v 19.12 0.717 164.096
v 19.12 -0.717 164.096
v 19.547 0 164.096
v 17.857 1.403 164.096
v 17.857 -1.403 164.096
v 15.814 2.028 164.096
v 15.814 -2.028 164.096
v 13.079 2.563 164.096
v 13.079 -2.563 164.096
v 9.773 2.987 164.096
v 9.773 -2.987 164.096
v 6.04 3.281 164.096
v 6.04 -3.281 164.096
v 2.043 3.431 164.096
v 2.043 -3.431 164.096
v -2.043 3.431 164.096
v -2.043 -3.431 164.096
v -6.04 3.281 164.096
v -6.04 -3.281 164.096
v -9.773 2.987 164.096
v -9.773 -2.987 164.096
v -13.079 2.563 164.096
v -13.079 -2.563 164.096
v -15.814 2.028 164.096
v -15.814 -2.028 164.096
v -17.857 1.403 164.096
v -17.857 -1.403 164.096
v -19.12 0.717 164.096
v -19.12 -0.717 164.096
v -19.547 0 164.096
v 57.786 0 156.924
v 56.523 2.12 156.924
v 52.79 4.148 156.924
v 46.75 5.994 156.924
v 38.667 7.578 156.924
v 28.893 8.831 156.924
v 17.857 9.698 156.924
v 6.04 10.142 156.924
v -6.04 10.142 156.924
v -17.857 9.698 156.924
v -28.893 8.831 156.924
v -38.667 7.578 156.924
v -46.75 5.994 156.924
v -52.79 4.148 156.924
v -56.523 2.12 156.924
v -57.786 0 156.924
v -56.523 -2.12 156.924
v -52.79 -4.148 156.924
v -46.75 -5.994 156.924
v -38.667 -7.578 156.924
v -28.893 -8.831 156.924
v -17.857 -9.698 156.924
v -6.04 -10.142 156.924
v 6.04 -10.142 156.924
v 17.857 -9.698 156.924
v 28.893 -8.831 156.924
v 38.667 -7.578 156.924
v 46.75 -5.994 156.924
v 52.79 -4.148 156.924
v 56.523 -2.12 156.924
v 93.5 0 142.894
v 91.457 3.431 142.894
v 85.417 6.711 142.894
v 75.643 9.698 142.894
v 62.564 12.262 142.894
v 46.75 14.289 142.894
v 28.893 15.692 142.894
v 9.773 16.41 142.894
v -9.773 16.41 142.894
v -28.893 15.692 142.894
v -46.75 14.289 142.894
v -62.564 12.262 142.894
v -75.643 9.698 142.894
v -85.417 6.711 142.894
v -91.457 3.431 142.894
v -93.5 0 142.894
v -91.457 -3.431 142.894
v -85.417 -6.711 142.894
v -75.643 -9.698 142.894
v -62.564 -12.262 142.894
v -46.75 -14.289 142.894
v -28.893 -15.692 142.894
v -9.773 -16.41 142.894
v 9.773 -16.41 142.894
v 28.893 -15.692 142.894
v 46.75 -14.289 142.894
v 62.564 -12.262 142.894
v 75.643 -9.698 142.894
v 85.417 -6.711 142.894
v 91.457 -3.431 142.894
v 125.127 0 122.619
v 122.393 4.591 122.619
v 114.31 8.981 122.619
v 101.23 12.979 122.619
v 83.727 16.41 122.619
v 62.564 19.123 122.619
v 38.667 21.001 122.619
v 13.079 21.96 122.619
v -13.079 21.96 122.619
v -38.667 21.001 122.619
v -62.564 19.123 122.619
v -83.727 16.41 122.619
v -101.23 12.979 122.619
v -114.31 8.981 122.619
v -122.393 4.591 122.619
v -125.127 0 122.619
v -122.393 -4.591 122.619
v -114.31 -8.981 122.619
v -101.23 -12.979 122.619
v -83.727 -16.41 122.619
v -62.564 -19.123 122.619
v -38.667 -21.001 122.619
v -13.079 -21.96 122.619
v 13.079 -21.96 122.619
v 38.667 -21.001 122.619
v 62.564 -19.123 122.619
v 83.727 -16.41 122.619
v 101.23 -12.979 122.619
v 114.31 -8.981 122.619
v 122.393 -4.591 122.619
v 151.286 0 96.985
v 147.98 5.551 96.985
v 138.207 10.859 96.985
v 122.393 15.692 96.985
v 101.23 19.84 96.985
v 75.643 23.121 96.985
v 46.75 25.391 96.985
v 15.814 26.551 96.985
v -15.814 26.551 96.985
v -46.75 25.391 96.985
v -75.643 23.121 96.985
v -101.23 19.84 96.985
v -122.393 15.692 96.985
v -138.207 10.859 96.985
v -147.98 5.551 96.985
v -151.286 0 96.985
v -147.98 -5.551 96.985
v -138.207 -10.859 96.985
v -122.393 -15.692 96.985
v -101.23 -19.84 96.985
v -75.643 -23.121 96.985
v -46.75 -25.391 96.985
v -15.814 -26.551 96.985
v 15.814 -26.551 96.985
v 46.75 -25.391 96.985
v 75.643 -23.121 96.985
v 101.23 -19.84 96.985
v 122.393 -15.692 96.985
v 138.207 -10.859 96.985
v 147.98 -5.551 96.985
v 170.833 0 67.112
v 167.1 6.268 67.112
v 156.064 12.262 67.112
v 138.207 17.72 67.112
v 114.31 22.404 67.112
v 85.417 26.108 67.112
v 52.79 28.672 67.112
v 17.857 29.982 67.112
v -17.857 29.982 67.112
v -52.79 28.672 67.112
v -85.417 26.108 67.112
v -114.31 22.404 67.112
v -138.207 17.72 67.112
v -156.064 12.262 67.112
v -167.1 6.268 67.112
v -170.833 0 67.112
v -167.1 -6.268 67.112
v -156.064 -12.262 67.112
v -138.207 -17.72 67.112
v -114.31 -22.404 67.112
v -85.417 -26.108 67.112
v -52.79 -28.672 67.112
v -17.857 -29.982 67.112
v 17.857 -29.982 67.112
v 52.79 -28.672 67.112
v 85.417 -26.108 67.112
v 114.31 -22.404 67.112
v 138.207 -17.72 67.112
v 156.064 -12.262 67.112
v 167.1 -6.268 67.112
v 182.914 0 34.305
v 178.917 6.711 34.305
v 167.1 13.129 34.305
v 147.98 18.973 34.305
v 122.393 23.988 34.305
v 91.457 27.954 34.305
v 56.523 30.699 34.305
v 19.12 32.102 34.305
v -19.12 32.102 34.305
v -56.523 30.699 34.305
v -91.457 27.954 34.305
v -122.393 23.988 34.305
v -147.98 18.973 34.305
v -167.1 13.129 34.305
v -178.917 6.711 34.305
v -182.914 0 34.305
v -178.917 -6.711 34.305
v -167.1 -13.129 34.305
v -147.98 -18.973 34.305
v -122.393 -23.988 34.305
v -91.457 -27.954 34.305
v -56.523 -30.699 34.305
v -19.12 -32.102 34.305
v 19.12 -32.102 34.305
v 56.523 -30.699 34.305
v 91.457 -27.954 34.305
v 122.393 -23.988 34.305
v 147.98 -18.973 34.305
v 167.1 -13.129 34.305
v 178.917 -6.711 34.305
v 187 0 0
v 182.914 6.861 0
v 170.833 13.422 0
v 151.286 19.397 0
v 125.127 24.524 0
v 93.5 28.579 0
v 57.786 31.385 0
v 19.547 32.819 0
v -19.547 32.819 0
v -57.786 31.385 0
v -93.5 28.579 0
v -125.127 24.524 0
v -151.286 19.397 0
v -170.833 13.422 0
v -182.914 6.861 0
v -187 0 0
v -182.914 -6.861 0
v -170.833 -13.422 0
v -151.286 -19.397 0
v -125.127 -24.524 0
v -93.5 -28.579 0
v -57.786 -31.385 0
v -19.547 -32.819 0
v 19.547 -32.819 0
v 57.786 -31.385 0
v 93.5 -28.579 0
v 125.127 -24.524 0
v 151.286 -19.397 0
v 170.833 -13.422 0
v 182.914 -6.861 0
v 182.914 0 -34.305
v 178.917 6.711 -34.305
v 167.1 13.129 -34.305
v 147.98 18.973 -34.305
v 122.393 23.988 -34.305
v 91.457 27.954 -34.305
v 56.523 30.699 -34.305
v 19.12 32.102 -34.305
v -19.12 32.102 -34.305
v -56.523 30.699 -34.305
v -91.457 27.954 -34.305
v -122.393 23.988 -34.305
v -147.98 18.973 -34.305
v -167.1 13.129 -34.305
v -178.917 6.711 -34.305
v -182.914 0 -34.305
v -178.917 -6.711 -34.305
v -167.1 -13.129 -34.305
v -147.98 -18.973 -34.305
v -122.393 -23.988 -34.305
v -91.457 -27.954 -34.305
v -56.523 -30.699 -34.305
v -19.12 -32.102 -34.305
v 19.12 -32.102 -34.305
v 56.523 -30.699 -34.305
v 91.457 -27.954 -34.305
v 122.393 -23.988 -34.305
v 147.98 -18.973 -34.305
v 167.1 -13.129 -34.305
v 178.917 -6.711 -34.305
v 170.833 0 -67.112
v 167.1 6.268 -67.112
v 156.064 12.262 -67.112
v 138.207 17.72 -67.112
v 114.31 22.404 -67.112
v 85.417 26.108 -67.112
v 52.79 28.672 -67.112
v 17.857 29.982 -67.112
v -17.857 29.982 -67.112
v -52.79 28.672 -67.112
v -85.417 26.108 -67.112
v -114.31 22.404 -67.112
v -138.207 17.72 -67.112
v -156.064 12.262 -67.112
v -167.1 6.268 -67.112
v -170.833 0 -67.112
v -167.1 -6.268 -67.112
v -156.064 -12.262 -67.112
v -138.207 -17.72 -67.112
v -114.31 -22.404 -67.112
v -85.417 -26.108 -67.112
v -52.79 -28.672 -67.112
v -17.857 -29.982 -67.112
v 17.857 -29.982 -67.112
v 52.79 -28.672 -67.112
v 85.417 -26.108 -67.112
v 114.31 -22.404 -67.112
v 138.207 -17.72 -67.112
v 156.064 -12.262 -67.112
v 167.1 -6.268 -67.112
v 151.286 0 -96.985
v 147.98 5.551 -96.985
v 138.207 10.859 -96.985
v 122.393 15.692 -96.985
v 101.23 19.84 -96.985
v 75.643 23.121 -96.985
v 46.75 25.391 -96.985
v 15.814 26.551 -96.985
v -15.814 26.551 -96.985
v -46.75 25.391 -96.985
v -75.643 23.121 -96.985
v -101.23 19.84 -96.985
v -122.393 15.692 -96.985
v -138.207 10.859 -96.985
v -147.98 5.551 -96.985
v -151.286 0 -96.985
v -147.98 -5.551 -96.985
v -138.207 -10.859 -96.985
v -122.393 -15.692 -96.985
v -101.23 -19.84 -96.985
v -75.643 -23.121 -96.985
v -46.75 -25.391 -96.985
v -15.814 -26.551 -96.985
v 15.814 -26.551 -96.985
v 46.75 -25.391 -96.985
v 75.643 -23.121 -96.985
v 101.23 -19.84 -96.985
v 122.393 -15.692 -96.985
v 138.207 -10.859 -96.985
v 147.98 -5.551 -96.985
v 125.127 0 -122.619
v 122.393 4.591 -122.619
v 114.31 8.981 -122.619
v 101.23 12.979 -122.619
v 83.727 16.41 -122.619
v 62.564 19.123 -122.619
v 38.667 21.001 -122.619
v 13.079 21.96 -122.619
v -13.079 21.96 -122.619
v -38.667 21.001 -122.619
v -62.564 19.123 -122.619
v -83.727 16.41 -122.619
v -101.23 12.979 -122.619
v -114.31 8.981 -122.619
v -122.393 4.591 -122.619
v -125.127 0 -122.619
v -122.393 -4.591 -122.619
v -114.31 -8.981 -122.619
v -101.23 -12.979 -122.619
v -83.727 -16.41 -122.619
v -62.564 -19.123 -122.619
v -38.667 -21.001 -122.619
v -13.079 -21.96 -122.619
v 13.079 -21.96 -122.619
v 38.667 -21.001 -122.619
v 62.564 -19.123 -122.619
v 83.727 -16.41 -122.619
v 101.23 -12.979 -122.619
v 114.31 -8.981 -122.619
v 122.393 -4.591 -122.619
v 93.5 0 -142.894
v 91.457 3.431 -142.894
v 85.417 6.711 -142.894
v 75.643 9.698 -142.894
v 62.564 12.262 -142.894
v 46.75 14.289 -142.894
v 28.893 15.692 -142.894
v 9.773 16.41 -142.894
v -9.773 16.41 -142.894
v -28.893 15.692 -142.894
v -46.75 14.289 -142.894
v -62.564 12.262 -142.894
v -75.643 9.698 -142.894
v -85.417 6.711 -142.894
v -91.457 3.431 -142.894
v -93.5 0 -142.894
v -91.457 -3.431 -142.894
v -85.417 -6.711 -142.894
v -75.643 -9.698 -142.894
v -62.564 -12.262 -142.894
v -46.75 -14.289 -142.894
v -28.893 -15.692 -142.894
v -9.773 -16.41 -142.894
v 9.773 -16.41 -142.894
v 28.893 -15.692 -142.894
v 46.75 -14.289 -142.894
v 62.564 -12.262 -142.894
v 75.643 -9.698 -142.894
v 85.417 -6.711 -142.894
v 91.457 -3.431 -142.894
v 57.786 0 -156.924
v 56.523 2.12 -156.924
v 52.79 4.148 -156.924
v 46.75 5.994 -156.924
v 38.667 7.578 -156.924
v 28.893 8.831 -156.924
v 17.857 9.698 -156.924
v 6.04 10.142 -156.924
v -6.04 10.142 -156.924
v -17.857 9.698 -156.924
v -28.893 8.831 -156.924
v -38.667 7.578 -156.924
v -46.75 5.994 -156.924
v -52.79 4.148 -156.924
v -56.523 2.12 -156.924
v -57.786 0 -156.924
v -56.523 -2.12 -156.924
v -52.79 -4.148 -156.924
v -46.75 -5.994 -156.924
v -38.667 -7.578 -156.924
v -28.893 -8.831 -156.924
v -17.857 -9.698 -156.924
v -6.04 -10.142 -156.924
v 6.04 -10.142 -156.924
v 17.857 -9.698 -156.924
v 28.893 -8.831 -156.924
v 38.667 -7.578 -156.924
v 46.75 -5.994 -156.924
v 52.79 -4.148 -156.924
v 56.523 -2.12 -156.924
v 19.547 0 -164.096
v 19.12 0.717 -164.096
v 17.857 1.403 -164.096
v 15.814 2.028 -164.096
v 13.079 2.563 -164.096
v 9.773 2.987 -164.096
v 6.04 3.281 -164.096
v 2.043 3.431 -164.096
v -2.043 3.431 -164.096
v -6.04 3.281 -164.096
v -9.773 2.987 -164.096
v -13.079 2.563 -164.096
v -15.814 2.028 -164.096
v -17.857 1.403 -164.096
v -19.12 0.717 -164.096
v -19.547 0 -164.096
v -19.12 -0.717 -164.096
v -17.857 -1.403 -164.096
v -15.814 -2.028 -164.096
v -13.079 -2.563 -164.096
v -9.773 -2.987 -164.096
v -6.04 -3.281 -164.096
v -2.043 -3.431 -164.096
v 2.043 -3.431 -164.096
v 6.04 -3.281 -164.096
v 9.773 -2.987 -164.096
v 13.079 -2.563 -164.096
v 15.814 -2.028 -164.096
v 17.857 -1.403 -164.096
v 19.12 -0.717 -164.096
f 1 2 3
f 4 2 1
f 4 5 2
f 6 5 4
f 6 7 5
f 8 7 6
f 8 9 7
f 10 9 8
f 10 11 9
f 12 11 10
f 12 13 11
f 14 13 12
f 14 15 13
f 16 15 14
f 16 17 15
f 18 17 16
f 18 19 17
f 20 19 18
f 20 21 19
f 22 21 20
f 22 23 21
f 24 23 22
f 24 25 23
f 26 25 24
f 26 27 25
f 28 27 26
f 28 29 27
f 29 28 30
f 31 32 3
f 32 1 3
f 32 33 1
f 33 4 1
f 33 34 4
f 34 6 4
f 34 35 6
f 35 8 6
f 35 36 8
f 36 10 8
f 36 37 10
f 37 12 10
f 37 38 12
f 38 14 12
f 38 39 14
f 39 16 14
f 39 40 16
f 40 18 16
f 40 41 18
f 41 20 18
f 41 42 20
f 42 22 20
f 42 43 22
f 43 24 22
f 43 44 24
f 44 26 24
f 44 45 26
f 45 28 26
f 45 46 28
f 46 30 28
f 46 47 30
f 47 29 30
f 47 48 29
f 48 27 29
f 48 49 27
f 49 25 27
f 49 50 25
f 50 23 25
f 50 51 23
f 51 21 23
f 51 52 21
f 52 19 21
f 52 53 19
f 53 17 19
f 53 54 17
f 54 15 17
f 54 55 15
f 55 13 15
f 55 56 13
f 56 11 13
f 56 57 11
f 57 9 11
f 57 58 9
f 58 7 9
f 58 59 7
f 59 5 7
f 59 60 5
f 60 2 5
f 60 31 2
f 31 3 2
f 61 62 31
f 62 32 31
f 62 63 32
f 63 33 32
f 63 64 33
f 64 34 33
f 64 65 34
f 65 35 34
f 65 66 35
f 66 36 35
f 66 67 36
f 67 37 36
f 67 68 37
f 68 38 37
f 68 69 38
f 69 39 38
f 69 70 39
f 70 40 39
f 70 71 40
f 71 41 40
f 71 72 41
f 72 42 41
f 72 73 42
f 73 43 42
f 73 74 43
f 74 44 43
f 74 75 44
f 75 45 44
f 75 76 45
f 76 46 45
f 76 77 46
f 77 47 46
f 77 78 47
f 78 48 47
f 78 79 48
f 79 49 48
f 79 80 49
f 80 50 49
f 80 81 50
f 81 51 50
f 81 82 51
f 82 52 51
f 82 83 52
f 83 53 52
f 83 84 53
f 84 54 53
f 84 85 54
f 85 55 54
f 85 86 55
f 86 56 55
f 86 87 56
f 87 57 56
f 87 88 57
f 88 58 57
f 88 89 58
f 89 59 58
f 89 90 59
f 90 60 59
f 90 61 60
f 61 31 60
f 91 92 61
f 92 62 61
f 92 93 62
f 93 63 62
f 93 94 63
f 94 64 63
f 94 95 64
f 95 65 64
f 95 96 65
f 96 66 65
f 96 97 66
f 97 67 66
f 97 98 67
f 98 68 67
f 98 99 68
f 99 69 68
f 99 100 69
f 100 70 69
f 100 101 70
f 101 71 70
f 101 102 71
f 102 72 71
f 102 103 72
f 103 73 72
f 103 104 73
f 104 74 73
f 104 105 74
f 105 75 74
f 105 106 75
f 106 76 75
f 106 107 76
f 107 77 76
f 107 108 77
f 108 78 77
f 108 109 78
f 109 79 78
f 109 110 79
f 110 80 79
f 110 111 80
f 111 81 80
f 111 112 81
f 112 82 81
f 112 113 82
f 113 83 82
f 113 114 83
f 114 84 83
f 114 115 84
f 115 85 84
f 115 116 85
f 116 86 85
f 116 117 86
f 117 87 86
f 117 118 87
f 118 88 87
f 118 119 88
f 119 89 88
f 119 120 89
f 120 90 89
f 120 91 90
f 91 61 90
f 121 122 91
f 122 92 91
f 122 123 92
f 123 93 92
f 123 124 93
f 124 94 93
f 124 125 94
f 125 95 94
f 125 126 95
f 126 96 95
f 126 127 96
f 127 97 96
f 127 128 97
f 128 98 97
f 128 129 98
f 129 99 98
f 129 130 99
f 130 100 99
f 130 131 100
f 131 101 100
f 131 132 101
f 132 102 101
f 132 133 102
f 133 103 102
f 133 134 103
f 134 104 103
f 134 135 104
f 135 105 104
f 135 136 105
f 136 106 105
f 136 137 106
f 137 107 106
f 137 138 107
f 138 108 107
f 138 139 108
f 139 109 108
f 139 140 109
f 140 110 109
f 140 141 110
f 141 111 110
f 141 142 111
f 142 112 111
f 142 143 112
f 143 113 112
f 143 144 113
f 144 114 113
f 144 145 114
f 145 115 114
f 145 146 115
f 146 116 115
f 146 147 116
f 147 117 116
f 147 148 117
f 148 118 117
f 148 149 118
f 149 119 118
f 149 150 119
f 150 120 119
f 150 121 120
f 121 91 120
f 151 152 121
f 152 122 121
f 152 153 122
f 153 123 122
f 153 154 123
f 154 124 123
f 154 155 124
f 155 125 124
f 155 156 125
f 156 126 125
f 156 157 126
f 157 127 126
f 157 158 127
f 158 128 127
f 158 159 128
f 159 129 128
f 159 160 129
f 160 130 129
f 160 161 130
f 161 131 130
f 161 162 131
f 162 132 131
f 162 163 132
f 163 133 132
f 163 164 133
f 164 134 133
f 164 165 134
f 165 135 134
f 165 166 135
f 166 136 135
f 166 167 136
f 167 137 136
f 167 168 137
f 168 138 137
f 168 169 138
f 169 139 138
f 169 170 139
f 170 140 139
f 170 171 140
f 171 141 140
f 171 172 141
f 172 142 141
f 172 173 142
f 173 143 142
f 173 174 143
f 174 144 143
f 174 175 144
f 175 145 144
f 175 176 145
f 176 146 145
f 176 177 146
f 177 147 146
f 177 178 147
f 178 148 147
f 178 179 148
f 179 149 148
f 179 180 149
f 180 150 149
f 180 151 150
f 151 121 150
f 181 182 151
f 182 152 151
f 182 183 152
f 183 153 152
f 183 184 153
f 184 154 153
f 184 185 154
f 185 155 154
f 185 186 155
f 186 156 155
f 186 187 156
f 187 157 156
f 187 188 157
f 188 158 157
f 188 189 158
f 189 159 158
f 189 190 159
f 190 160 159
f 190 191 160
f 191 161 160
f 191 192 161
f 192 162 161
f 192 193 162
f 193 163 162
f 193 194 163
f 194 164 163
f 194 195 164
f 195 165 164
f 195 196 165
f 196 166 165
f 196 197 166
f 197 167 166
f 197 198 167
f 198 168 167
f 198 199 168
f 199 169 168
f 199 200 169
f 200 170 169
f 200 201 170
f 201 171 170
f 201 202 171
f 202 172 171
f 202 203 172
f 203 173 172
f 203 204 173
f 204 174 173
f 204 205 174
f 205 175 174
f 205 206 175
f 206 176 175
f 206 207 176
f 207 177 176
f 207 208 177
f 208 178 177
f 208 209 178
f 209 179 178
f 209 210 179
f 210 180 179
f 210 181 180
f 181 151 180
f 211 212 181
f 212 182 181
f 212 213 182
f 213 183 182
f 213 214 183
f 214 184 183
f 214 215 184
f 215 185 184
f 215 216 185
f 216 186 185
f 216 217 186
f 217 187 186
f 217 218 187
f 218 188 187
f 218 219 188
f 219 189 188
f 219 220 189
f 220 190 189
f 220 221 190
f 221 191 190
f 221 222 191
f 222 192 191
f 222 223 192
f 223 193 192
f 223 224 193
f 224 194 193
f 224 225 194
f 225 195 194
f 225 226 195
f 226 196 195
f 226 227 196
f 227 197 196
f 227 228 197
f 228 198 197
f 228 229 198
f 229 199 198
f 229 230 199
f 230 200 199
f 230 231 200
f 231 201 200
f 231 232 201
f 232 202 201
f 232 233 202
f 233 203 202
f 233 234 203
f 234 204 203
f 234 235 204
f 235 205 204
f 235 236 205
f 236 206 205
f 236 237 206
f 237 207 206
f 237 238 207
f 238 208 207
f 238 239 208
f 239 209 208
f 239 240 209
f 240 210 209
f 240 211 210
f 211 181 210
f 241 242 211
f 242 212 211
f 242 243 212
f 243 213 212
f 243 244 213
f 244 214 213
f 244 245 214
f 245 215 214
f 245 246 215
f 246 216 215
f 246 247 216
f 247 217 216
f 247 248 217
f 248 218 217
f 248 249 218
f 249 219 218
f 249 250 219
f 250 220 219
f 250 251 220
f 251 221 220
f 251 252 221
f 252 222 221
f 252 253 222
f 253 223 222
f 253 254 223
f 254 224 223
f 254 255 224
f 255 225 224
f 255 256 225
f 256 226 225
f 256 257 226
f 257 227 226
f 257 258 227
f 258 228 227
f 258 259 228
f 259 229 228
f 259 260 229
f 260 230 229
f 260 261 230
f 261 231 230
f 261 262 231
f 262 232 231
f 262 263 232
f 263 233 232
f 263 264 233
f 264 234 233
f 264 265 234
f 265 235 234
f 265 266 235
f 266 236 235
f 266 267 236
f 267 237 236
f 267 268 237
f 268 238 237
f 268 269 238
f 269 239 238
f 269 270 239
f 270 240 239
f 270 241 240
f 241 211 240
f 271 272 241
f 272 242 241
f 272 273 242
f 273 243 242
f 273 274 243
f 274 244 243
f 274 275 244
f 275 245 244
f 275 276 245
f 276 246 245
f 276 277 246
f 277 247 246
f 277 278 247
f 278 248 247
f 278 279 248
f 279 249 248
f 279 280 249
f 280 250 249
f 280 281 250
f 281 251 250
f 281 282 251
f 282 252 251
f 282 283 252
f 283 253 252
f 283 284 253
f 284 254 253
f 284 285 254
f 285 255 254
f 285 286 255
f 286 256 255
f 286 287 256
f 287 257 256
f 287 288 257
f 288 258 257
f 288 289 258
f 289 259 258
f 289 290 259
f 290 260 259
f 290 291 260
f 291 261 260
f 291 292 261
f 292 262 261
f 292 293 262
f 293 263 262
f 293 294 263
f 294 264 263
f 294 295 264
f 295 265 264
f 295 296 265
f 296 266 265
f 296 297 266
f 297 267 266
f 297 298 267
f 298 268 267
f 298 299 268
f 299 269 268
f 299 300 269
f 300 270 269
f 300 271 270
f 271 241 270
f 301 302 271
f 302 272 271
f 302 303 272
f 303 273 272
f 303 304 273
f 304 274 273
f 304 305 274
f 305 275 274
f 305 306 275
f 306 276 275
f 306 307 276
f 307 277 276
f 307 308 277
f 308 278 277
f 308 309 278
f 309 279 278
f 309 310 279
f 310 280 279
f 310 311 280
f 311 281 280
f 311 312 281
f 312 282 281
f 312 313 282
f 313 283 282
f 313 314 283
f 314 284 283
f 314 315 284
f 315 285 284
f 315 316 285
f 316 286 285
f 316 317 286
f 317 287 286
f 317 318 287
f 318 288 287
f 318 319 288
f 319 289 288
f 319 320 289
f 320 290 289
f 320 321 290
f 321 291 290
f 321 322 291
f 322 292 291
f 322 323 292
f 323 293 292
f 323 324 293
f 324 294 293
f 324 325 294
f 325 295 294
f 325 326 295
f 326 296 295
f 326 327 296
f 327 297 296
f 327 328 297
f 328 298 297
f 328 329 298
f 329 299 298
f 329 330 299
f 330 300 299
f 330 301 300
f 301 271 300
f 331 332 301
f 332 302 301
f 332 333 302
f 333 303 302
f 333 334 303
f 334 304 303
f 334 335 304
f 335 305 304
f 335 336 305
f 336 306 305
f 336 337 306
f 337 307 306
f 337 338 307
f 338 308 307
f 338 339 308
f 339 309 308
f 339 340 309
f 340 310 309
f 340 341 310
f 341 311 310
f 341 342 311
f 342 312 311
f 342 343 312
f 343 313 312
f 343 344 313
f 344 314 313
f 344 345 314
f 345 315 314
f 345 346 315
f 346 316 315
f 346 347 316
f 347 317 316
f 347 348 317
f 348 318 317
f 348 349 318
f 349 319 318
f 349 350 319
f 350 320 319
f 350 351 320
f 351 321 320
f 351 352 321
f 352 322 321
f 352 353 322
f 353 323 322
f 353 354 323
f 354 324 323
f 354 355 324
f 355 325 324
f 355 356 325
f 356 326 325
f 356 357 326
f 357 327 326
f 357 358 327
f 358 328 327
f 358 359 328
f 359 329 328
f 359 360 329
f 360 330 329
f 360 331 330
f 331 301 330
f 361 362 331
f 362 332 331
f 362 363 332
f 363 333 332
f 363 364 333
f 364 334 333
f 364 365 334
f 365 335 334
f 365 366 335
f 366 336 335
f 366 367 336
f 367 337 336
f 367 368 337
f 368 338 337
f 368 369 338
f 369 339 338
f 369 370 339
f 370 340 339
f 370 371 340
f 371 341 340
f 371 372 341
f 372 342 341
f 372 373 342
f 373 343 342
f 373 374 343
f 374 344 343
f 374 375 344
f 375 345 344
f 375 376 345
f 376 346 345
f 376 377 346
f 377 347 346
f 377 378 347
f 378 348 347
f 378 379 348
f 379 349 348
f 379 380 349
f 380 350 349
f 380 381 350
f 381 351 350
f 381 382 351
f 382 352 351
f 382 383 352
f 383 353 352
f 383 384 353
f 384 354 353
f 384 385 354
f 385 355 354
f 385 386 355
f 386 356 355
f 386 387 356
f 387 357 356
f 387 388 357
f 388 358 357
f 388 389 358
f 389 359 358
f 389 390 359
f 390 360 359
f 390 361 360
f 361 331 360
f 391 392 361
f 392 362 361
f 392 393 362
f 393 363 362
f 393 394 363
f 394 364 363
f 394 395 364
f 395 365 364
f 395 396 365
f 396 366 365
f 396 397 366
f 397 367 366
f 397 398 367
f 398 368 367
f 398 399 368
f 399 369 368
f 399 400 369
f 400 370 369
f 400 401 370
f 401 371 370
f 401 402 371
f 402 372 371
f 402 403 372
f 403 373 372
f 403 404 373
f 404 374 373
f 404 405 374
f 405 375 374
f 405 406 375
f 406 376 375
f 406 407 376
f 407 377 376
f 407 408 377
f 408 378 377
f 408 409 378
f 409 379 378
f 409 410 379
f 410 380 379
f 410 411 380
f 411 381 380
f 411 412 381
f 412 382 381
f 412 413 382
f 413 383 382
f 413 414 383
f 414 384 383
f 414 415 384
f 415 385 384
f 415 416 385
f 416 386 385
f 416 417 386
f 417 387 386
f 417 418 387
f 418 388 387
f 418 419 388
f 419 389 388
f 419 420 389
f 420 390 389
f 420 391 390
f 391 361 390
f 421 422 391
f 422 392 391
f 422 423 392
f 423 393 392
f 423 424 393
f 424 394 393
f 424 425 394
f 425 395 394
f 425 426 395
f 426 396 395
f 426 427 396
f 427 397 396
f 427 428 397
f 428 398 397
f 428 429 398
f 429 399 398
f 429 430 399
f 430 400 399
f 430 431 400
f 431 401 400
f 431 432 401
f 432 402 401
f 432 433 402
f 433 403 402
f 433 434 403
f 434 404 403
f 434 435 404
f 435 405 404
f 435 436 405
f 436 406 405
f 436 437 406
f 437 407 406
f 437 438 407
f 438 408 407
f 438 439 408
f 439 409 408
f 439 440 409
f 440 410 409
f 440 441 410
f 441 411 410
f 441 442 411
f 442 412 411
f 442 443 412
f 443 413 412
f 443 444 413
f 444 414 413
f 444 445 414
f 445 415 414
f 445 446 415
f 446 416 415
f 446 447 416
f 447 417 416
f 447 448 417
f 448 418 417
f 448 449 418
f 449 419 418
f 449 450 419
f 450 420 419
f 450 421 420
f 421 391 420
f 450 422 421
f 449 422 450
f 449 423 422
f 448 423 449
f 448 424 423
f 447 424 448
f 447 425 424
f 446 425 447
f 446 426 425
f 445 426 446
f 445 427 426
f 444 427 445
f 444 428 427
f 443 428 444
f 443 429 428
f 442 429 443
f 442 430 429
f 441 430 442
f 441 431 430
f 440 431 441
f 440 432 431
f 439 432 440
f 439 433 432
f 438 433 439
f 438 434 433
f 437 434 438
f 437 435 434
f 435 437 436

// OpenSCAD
// Generated by SolidPython 1.0.1 on 2020-07-29 00:46:52


scale(v = [17, 3, 15]) {
	sphere(r = 11);
}
/***********************************************
*********      SolidPython code:      **********
************************************************
 
# import packages: SolidPython
from solid import *
from solid.utils import *
from itertools import chain, combinations, permutations


class Resize:

    def __init__(self, scad_file):
        self.scad_file = scad_file
        #self.scad_file = import_scad(scad_file)
        # cone/cylinder param:
        self.r1 = 0
        self.r2 = 0
        self.h = 0
        # rectangular prism param:
        self.w = 0
        self.l = 0
        # ellipse param:
        self.r = 0

    # import OpenScad code (file name corresponds to shape)


    # classify shape + parameters
    def assign(self, param1, param2, param3):
        if self.scad_file == 'cone.scad':
            self.r1 = param1
            self.r2 = param2
            self.h = param3
        elif self.scad_file == 'cylinder.scad':
            self.r1 = param1
            self.r2 = param2
            self.h = param3
        elif self.scad_file == 'rectangularPrism.scad':
            self.h = param1
            self.l = param2
            self.w = param3
        else:
            self.r = param1
            self.h = param2

    # resize parameters
    def iterate(self):
        x = range(3, 20, 2)
        i = 1
        if self.scad_file == 'cone.scad':
            tempList = list(permutations(x, 2))
            for temp in tempList:
                param1 = temp[0]
                param2 = temp[1]
                filepath = 'produced_scad_files/' + 'cone' + str(param1) + '_' + str(param2) + '_' + '.scad'
                scad_render_to_file(cylinder(h=param1, r1=param2, r2=0), filepath)

        elif self.scad_file == 'cylinder.scad':
            tempList = list(permutations(x, 3))
            for temp in tempList:
                param1 = temp[0]
                param2 = temp[1]
                filepath = 'produced_scad_files/' + 'cylinder' + str(param1) + '_' + str(param2) + '_' + '.scad'
                scad_render_to_file(cylinder(h=param1, r1=param2, r2=param2), filepath)

        elif self.scad_file == 'rectangularPrism.scad':
            tempList = list(permutations(x, 3))
            for temp in tempList:
                param1 = temp[0]
                param2 = temp[1]
                param3 = temp[2]
                filepath = 'produced_scad_files/' + 'rectangularPrism' + str(param1) + '_' + str(param2) + '_' + str(
                    param3) + '.scad'
                scad_render_to_file(cube(size=(param1, param2, param3)), filepath)

        elif self.scad_file == 'ellipse.scad':
            tempList = list(permutations(x, 4))
            for temp in tempList:
                param1 = temp[0]
                param2 = temp[1]
                param3 = temp[2]
                param4 = temp[3]
                filepath = 'produced_scad_files/' + 'ellipse' + str(param1) + '_' + str(param2) + '_' + str(param3) + '_' + str(param4) + '.scad'
                scad_render_to_file(scale([param1, param2, param3])(sphere(r=param4)), filepath)

    def render_to_scadfile(self):
        scad_render_to_file(scad, 'example.scad') 
 
************************************************/
